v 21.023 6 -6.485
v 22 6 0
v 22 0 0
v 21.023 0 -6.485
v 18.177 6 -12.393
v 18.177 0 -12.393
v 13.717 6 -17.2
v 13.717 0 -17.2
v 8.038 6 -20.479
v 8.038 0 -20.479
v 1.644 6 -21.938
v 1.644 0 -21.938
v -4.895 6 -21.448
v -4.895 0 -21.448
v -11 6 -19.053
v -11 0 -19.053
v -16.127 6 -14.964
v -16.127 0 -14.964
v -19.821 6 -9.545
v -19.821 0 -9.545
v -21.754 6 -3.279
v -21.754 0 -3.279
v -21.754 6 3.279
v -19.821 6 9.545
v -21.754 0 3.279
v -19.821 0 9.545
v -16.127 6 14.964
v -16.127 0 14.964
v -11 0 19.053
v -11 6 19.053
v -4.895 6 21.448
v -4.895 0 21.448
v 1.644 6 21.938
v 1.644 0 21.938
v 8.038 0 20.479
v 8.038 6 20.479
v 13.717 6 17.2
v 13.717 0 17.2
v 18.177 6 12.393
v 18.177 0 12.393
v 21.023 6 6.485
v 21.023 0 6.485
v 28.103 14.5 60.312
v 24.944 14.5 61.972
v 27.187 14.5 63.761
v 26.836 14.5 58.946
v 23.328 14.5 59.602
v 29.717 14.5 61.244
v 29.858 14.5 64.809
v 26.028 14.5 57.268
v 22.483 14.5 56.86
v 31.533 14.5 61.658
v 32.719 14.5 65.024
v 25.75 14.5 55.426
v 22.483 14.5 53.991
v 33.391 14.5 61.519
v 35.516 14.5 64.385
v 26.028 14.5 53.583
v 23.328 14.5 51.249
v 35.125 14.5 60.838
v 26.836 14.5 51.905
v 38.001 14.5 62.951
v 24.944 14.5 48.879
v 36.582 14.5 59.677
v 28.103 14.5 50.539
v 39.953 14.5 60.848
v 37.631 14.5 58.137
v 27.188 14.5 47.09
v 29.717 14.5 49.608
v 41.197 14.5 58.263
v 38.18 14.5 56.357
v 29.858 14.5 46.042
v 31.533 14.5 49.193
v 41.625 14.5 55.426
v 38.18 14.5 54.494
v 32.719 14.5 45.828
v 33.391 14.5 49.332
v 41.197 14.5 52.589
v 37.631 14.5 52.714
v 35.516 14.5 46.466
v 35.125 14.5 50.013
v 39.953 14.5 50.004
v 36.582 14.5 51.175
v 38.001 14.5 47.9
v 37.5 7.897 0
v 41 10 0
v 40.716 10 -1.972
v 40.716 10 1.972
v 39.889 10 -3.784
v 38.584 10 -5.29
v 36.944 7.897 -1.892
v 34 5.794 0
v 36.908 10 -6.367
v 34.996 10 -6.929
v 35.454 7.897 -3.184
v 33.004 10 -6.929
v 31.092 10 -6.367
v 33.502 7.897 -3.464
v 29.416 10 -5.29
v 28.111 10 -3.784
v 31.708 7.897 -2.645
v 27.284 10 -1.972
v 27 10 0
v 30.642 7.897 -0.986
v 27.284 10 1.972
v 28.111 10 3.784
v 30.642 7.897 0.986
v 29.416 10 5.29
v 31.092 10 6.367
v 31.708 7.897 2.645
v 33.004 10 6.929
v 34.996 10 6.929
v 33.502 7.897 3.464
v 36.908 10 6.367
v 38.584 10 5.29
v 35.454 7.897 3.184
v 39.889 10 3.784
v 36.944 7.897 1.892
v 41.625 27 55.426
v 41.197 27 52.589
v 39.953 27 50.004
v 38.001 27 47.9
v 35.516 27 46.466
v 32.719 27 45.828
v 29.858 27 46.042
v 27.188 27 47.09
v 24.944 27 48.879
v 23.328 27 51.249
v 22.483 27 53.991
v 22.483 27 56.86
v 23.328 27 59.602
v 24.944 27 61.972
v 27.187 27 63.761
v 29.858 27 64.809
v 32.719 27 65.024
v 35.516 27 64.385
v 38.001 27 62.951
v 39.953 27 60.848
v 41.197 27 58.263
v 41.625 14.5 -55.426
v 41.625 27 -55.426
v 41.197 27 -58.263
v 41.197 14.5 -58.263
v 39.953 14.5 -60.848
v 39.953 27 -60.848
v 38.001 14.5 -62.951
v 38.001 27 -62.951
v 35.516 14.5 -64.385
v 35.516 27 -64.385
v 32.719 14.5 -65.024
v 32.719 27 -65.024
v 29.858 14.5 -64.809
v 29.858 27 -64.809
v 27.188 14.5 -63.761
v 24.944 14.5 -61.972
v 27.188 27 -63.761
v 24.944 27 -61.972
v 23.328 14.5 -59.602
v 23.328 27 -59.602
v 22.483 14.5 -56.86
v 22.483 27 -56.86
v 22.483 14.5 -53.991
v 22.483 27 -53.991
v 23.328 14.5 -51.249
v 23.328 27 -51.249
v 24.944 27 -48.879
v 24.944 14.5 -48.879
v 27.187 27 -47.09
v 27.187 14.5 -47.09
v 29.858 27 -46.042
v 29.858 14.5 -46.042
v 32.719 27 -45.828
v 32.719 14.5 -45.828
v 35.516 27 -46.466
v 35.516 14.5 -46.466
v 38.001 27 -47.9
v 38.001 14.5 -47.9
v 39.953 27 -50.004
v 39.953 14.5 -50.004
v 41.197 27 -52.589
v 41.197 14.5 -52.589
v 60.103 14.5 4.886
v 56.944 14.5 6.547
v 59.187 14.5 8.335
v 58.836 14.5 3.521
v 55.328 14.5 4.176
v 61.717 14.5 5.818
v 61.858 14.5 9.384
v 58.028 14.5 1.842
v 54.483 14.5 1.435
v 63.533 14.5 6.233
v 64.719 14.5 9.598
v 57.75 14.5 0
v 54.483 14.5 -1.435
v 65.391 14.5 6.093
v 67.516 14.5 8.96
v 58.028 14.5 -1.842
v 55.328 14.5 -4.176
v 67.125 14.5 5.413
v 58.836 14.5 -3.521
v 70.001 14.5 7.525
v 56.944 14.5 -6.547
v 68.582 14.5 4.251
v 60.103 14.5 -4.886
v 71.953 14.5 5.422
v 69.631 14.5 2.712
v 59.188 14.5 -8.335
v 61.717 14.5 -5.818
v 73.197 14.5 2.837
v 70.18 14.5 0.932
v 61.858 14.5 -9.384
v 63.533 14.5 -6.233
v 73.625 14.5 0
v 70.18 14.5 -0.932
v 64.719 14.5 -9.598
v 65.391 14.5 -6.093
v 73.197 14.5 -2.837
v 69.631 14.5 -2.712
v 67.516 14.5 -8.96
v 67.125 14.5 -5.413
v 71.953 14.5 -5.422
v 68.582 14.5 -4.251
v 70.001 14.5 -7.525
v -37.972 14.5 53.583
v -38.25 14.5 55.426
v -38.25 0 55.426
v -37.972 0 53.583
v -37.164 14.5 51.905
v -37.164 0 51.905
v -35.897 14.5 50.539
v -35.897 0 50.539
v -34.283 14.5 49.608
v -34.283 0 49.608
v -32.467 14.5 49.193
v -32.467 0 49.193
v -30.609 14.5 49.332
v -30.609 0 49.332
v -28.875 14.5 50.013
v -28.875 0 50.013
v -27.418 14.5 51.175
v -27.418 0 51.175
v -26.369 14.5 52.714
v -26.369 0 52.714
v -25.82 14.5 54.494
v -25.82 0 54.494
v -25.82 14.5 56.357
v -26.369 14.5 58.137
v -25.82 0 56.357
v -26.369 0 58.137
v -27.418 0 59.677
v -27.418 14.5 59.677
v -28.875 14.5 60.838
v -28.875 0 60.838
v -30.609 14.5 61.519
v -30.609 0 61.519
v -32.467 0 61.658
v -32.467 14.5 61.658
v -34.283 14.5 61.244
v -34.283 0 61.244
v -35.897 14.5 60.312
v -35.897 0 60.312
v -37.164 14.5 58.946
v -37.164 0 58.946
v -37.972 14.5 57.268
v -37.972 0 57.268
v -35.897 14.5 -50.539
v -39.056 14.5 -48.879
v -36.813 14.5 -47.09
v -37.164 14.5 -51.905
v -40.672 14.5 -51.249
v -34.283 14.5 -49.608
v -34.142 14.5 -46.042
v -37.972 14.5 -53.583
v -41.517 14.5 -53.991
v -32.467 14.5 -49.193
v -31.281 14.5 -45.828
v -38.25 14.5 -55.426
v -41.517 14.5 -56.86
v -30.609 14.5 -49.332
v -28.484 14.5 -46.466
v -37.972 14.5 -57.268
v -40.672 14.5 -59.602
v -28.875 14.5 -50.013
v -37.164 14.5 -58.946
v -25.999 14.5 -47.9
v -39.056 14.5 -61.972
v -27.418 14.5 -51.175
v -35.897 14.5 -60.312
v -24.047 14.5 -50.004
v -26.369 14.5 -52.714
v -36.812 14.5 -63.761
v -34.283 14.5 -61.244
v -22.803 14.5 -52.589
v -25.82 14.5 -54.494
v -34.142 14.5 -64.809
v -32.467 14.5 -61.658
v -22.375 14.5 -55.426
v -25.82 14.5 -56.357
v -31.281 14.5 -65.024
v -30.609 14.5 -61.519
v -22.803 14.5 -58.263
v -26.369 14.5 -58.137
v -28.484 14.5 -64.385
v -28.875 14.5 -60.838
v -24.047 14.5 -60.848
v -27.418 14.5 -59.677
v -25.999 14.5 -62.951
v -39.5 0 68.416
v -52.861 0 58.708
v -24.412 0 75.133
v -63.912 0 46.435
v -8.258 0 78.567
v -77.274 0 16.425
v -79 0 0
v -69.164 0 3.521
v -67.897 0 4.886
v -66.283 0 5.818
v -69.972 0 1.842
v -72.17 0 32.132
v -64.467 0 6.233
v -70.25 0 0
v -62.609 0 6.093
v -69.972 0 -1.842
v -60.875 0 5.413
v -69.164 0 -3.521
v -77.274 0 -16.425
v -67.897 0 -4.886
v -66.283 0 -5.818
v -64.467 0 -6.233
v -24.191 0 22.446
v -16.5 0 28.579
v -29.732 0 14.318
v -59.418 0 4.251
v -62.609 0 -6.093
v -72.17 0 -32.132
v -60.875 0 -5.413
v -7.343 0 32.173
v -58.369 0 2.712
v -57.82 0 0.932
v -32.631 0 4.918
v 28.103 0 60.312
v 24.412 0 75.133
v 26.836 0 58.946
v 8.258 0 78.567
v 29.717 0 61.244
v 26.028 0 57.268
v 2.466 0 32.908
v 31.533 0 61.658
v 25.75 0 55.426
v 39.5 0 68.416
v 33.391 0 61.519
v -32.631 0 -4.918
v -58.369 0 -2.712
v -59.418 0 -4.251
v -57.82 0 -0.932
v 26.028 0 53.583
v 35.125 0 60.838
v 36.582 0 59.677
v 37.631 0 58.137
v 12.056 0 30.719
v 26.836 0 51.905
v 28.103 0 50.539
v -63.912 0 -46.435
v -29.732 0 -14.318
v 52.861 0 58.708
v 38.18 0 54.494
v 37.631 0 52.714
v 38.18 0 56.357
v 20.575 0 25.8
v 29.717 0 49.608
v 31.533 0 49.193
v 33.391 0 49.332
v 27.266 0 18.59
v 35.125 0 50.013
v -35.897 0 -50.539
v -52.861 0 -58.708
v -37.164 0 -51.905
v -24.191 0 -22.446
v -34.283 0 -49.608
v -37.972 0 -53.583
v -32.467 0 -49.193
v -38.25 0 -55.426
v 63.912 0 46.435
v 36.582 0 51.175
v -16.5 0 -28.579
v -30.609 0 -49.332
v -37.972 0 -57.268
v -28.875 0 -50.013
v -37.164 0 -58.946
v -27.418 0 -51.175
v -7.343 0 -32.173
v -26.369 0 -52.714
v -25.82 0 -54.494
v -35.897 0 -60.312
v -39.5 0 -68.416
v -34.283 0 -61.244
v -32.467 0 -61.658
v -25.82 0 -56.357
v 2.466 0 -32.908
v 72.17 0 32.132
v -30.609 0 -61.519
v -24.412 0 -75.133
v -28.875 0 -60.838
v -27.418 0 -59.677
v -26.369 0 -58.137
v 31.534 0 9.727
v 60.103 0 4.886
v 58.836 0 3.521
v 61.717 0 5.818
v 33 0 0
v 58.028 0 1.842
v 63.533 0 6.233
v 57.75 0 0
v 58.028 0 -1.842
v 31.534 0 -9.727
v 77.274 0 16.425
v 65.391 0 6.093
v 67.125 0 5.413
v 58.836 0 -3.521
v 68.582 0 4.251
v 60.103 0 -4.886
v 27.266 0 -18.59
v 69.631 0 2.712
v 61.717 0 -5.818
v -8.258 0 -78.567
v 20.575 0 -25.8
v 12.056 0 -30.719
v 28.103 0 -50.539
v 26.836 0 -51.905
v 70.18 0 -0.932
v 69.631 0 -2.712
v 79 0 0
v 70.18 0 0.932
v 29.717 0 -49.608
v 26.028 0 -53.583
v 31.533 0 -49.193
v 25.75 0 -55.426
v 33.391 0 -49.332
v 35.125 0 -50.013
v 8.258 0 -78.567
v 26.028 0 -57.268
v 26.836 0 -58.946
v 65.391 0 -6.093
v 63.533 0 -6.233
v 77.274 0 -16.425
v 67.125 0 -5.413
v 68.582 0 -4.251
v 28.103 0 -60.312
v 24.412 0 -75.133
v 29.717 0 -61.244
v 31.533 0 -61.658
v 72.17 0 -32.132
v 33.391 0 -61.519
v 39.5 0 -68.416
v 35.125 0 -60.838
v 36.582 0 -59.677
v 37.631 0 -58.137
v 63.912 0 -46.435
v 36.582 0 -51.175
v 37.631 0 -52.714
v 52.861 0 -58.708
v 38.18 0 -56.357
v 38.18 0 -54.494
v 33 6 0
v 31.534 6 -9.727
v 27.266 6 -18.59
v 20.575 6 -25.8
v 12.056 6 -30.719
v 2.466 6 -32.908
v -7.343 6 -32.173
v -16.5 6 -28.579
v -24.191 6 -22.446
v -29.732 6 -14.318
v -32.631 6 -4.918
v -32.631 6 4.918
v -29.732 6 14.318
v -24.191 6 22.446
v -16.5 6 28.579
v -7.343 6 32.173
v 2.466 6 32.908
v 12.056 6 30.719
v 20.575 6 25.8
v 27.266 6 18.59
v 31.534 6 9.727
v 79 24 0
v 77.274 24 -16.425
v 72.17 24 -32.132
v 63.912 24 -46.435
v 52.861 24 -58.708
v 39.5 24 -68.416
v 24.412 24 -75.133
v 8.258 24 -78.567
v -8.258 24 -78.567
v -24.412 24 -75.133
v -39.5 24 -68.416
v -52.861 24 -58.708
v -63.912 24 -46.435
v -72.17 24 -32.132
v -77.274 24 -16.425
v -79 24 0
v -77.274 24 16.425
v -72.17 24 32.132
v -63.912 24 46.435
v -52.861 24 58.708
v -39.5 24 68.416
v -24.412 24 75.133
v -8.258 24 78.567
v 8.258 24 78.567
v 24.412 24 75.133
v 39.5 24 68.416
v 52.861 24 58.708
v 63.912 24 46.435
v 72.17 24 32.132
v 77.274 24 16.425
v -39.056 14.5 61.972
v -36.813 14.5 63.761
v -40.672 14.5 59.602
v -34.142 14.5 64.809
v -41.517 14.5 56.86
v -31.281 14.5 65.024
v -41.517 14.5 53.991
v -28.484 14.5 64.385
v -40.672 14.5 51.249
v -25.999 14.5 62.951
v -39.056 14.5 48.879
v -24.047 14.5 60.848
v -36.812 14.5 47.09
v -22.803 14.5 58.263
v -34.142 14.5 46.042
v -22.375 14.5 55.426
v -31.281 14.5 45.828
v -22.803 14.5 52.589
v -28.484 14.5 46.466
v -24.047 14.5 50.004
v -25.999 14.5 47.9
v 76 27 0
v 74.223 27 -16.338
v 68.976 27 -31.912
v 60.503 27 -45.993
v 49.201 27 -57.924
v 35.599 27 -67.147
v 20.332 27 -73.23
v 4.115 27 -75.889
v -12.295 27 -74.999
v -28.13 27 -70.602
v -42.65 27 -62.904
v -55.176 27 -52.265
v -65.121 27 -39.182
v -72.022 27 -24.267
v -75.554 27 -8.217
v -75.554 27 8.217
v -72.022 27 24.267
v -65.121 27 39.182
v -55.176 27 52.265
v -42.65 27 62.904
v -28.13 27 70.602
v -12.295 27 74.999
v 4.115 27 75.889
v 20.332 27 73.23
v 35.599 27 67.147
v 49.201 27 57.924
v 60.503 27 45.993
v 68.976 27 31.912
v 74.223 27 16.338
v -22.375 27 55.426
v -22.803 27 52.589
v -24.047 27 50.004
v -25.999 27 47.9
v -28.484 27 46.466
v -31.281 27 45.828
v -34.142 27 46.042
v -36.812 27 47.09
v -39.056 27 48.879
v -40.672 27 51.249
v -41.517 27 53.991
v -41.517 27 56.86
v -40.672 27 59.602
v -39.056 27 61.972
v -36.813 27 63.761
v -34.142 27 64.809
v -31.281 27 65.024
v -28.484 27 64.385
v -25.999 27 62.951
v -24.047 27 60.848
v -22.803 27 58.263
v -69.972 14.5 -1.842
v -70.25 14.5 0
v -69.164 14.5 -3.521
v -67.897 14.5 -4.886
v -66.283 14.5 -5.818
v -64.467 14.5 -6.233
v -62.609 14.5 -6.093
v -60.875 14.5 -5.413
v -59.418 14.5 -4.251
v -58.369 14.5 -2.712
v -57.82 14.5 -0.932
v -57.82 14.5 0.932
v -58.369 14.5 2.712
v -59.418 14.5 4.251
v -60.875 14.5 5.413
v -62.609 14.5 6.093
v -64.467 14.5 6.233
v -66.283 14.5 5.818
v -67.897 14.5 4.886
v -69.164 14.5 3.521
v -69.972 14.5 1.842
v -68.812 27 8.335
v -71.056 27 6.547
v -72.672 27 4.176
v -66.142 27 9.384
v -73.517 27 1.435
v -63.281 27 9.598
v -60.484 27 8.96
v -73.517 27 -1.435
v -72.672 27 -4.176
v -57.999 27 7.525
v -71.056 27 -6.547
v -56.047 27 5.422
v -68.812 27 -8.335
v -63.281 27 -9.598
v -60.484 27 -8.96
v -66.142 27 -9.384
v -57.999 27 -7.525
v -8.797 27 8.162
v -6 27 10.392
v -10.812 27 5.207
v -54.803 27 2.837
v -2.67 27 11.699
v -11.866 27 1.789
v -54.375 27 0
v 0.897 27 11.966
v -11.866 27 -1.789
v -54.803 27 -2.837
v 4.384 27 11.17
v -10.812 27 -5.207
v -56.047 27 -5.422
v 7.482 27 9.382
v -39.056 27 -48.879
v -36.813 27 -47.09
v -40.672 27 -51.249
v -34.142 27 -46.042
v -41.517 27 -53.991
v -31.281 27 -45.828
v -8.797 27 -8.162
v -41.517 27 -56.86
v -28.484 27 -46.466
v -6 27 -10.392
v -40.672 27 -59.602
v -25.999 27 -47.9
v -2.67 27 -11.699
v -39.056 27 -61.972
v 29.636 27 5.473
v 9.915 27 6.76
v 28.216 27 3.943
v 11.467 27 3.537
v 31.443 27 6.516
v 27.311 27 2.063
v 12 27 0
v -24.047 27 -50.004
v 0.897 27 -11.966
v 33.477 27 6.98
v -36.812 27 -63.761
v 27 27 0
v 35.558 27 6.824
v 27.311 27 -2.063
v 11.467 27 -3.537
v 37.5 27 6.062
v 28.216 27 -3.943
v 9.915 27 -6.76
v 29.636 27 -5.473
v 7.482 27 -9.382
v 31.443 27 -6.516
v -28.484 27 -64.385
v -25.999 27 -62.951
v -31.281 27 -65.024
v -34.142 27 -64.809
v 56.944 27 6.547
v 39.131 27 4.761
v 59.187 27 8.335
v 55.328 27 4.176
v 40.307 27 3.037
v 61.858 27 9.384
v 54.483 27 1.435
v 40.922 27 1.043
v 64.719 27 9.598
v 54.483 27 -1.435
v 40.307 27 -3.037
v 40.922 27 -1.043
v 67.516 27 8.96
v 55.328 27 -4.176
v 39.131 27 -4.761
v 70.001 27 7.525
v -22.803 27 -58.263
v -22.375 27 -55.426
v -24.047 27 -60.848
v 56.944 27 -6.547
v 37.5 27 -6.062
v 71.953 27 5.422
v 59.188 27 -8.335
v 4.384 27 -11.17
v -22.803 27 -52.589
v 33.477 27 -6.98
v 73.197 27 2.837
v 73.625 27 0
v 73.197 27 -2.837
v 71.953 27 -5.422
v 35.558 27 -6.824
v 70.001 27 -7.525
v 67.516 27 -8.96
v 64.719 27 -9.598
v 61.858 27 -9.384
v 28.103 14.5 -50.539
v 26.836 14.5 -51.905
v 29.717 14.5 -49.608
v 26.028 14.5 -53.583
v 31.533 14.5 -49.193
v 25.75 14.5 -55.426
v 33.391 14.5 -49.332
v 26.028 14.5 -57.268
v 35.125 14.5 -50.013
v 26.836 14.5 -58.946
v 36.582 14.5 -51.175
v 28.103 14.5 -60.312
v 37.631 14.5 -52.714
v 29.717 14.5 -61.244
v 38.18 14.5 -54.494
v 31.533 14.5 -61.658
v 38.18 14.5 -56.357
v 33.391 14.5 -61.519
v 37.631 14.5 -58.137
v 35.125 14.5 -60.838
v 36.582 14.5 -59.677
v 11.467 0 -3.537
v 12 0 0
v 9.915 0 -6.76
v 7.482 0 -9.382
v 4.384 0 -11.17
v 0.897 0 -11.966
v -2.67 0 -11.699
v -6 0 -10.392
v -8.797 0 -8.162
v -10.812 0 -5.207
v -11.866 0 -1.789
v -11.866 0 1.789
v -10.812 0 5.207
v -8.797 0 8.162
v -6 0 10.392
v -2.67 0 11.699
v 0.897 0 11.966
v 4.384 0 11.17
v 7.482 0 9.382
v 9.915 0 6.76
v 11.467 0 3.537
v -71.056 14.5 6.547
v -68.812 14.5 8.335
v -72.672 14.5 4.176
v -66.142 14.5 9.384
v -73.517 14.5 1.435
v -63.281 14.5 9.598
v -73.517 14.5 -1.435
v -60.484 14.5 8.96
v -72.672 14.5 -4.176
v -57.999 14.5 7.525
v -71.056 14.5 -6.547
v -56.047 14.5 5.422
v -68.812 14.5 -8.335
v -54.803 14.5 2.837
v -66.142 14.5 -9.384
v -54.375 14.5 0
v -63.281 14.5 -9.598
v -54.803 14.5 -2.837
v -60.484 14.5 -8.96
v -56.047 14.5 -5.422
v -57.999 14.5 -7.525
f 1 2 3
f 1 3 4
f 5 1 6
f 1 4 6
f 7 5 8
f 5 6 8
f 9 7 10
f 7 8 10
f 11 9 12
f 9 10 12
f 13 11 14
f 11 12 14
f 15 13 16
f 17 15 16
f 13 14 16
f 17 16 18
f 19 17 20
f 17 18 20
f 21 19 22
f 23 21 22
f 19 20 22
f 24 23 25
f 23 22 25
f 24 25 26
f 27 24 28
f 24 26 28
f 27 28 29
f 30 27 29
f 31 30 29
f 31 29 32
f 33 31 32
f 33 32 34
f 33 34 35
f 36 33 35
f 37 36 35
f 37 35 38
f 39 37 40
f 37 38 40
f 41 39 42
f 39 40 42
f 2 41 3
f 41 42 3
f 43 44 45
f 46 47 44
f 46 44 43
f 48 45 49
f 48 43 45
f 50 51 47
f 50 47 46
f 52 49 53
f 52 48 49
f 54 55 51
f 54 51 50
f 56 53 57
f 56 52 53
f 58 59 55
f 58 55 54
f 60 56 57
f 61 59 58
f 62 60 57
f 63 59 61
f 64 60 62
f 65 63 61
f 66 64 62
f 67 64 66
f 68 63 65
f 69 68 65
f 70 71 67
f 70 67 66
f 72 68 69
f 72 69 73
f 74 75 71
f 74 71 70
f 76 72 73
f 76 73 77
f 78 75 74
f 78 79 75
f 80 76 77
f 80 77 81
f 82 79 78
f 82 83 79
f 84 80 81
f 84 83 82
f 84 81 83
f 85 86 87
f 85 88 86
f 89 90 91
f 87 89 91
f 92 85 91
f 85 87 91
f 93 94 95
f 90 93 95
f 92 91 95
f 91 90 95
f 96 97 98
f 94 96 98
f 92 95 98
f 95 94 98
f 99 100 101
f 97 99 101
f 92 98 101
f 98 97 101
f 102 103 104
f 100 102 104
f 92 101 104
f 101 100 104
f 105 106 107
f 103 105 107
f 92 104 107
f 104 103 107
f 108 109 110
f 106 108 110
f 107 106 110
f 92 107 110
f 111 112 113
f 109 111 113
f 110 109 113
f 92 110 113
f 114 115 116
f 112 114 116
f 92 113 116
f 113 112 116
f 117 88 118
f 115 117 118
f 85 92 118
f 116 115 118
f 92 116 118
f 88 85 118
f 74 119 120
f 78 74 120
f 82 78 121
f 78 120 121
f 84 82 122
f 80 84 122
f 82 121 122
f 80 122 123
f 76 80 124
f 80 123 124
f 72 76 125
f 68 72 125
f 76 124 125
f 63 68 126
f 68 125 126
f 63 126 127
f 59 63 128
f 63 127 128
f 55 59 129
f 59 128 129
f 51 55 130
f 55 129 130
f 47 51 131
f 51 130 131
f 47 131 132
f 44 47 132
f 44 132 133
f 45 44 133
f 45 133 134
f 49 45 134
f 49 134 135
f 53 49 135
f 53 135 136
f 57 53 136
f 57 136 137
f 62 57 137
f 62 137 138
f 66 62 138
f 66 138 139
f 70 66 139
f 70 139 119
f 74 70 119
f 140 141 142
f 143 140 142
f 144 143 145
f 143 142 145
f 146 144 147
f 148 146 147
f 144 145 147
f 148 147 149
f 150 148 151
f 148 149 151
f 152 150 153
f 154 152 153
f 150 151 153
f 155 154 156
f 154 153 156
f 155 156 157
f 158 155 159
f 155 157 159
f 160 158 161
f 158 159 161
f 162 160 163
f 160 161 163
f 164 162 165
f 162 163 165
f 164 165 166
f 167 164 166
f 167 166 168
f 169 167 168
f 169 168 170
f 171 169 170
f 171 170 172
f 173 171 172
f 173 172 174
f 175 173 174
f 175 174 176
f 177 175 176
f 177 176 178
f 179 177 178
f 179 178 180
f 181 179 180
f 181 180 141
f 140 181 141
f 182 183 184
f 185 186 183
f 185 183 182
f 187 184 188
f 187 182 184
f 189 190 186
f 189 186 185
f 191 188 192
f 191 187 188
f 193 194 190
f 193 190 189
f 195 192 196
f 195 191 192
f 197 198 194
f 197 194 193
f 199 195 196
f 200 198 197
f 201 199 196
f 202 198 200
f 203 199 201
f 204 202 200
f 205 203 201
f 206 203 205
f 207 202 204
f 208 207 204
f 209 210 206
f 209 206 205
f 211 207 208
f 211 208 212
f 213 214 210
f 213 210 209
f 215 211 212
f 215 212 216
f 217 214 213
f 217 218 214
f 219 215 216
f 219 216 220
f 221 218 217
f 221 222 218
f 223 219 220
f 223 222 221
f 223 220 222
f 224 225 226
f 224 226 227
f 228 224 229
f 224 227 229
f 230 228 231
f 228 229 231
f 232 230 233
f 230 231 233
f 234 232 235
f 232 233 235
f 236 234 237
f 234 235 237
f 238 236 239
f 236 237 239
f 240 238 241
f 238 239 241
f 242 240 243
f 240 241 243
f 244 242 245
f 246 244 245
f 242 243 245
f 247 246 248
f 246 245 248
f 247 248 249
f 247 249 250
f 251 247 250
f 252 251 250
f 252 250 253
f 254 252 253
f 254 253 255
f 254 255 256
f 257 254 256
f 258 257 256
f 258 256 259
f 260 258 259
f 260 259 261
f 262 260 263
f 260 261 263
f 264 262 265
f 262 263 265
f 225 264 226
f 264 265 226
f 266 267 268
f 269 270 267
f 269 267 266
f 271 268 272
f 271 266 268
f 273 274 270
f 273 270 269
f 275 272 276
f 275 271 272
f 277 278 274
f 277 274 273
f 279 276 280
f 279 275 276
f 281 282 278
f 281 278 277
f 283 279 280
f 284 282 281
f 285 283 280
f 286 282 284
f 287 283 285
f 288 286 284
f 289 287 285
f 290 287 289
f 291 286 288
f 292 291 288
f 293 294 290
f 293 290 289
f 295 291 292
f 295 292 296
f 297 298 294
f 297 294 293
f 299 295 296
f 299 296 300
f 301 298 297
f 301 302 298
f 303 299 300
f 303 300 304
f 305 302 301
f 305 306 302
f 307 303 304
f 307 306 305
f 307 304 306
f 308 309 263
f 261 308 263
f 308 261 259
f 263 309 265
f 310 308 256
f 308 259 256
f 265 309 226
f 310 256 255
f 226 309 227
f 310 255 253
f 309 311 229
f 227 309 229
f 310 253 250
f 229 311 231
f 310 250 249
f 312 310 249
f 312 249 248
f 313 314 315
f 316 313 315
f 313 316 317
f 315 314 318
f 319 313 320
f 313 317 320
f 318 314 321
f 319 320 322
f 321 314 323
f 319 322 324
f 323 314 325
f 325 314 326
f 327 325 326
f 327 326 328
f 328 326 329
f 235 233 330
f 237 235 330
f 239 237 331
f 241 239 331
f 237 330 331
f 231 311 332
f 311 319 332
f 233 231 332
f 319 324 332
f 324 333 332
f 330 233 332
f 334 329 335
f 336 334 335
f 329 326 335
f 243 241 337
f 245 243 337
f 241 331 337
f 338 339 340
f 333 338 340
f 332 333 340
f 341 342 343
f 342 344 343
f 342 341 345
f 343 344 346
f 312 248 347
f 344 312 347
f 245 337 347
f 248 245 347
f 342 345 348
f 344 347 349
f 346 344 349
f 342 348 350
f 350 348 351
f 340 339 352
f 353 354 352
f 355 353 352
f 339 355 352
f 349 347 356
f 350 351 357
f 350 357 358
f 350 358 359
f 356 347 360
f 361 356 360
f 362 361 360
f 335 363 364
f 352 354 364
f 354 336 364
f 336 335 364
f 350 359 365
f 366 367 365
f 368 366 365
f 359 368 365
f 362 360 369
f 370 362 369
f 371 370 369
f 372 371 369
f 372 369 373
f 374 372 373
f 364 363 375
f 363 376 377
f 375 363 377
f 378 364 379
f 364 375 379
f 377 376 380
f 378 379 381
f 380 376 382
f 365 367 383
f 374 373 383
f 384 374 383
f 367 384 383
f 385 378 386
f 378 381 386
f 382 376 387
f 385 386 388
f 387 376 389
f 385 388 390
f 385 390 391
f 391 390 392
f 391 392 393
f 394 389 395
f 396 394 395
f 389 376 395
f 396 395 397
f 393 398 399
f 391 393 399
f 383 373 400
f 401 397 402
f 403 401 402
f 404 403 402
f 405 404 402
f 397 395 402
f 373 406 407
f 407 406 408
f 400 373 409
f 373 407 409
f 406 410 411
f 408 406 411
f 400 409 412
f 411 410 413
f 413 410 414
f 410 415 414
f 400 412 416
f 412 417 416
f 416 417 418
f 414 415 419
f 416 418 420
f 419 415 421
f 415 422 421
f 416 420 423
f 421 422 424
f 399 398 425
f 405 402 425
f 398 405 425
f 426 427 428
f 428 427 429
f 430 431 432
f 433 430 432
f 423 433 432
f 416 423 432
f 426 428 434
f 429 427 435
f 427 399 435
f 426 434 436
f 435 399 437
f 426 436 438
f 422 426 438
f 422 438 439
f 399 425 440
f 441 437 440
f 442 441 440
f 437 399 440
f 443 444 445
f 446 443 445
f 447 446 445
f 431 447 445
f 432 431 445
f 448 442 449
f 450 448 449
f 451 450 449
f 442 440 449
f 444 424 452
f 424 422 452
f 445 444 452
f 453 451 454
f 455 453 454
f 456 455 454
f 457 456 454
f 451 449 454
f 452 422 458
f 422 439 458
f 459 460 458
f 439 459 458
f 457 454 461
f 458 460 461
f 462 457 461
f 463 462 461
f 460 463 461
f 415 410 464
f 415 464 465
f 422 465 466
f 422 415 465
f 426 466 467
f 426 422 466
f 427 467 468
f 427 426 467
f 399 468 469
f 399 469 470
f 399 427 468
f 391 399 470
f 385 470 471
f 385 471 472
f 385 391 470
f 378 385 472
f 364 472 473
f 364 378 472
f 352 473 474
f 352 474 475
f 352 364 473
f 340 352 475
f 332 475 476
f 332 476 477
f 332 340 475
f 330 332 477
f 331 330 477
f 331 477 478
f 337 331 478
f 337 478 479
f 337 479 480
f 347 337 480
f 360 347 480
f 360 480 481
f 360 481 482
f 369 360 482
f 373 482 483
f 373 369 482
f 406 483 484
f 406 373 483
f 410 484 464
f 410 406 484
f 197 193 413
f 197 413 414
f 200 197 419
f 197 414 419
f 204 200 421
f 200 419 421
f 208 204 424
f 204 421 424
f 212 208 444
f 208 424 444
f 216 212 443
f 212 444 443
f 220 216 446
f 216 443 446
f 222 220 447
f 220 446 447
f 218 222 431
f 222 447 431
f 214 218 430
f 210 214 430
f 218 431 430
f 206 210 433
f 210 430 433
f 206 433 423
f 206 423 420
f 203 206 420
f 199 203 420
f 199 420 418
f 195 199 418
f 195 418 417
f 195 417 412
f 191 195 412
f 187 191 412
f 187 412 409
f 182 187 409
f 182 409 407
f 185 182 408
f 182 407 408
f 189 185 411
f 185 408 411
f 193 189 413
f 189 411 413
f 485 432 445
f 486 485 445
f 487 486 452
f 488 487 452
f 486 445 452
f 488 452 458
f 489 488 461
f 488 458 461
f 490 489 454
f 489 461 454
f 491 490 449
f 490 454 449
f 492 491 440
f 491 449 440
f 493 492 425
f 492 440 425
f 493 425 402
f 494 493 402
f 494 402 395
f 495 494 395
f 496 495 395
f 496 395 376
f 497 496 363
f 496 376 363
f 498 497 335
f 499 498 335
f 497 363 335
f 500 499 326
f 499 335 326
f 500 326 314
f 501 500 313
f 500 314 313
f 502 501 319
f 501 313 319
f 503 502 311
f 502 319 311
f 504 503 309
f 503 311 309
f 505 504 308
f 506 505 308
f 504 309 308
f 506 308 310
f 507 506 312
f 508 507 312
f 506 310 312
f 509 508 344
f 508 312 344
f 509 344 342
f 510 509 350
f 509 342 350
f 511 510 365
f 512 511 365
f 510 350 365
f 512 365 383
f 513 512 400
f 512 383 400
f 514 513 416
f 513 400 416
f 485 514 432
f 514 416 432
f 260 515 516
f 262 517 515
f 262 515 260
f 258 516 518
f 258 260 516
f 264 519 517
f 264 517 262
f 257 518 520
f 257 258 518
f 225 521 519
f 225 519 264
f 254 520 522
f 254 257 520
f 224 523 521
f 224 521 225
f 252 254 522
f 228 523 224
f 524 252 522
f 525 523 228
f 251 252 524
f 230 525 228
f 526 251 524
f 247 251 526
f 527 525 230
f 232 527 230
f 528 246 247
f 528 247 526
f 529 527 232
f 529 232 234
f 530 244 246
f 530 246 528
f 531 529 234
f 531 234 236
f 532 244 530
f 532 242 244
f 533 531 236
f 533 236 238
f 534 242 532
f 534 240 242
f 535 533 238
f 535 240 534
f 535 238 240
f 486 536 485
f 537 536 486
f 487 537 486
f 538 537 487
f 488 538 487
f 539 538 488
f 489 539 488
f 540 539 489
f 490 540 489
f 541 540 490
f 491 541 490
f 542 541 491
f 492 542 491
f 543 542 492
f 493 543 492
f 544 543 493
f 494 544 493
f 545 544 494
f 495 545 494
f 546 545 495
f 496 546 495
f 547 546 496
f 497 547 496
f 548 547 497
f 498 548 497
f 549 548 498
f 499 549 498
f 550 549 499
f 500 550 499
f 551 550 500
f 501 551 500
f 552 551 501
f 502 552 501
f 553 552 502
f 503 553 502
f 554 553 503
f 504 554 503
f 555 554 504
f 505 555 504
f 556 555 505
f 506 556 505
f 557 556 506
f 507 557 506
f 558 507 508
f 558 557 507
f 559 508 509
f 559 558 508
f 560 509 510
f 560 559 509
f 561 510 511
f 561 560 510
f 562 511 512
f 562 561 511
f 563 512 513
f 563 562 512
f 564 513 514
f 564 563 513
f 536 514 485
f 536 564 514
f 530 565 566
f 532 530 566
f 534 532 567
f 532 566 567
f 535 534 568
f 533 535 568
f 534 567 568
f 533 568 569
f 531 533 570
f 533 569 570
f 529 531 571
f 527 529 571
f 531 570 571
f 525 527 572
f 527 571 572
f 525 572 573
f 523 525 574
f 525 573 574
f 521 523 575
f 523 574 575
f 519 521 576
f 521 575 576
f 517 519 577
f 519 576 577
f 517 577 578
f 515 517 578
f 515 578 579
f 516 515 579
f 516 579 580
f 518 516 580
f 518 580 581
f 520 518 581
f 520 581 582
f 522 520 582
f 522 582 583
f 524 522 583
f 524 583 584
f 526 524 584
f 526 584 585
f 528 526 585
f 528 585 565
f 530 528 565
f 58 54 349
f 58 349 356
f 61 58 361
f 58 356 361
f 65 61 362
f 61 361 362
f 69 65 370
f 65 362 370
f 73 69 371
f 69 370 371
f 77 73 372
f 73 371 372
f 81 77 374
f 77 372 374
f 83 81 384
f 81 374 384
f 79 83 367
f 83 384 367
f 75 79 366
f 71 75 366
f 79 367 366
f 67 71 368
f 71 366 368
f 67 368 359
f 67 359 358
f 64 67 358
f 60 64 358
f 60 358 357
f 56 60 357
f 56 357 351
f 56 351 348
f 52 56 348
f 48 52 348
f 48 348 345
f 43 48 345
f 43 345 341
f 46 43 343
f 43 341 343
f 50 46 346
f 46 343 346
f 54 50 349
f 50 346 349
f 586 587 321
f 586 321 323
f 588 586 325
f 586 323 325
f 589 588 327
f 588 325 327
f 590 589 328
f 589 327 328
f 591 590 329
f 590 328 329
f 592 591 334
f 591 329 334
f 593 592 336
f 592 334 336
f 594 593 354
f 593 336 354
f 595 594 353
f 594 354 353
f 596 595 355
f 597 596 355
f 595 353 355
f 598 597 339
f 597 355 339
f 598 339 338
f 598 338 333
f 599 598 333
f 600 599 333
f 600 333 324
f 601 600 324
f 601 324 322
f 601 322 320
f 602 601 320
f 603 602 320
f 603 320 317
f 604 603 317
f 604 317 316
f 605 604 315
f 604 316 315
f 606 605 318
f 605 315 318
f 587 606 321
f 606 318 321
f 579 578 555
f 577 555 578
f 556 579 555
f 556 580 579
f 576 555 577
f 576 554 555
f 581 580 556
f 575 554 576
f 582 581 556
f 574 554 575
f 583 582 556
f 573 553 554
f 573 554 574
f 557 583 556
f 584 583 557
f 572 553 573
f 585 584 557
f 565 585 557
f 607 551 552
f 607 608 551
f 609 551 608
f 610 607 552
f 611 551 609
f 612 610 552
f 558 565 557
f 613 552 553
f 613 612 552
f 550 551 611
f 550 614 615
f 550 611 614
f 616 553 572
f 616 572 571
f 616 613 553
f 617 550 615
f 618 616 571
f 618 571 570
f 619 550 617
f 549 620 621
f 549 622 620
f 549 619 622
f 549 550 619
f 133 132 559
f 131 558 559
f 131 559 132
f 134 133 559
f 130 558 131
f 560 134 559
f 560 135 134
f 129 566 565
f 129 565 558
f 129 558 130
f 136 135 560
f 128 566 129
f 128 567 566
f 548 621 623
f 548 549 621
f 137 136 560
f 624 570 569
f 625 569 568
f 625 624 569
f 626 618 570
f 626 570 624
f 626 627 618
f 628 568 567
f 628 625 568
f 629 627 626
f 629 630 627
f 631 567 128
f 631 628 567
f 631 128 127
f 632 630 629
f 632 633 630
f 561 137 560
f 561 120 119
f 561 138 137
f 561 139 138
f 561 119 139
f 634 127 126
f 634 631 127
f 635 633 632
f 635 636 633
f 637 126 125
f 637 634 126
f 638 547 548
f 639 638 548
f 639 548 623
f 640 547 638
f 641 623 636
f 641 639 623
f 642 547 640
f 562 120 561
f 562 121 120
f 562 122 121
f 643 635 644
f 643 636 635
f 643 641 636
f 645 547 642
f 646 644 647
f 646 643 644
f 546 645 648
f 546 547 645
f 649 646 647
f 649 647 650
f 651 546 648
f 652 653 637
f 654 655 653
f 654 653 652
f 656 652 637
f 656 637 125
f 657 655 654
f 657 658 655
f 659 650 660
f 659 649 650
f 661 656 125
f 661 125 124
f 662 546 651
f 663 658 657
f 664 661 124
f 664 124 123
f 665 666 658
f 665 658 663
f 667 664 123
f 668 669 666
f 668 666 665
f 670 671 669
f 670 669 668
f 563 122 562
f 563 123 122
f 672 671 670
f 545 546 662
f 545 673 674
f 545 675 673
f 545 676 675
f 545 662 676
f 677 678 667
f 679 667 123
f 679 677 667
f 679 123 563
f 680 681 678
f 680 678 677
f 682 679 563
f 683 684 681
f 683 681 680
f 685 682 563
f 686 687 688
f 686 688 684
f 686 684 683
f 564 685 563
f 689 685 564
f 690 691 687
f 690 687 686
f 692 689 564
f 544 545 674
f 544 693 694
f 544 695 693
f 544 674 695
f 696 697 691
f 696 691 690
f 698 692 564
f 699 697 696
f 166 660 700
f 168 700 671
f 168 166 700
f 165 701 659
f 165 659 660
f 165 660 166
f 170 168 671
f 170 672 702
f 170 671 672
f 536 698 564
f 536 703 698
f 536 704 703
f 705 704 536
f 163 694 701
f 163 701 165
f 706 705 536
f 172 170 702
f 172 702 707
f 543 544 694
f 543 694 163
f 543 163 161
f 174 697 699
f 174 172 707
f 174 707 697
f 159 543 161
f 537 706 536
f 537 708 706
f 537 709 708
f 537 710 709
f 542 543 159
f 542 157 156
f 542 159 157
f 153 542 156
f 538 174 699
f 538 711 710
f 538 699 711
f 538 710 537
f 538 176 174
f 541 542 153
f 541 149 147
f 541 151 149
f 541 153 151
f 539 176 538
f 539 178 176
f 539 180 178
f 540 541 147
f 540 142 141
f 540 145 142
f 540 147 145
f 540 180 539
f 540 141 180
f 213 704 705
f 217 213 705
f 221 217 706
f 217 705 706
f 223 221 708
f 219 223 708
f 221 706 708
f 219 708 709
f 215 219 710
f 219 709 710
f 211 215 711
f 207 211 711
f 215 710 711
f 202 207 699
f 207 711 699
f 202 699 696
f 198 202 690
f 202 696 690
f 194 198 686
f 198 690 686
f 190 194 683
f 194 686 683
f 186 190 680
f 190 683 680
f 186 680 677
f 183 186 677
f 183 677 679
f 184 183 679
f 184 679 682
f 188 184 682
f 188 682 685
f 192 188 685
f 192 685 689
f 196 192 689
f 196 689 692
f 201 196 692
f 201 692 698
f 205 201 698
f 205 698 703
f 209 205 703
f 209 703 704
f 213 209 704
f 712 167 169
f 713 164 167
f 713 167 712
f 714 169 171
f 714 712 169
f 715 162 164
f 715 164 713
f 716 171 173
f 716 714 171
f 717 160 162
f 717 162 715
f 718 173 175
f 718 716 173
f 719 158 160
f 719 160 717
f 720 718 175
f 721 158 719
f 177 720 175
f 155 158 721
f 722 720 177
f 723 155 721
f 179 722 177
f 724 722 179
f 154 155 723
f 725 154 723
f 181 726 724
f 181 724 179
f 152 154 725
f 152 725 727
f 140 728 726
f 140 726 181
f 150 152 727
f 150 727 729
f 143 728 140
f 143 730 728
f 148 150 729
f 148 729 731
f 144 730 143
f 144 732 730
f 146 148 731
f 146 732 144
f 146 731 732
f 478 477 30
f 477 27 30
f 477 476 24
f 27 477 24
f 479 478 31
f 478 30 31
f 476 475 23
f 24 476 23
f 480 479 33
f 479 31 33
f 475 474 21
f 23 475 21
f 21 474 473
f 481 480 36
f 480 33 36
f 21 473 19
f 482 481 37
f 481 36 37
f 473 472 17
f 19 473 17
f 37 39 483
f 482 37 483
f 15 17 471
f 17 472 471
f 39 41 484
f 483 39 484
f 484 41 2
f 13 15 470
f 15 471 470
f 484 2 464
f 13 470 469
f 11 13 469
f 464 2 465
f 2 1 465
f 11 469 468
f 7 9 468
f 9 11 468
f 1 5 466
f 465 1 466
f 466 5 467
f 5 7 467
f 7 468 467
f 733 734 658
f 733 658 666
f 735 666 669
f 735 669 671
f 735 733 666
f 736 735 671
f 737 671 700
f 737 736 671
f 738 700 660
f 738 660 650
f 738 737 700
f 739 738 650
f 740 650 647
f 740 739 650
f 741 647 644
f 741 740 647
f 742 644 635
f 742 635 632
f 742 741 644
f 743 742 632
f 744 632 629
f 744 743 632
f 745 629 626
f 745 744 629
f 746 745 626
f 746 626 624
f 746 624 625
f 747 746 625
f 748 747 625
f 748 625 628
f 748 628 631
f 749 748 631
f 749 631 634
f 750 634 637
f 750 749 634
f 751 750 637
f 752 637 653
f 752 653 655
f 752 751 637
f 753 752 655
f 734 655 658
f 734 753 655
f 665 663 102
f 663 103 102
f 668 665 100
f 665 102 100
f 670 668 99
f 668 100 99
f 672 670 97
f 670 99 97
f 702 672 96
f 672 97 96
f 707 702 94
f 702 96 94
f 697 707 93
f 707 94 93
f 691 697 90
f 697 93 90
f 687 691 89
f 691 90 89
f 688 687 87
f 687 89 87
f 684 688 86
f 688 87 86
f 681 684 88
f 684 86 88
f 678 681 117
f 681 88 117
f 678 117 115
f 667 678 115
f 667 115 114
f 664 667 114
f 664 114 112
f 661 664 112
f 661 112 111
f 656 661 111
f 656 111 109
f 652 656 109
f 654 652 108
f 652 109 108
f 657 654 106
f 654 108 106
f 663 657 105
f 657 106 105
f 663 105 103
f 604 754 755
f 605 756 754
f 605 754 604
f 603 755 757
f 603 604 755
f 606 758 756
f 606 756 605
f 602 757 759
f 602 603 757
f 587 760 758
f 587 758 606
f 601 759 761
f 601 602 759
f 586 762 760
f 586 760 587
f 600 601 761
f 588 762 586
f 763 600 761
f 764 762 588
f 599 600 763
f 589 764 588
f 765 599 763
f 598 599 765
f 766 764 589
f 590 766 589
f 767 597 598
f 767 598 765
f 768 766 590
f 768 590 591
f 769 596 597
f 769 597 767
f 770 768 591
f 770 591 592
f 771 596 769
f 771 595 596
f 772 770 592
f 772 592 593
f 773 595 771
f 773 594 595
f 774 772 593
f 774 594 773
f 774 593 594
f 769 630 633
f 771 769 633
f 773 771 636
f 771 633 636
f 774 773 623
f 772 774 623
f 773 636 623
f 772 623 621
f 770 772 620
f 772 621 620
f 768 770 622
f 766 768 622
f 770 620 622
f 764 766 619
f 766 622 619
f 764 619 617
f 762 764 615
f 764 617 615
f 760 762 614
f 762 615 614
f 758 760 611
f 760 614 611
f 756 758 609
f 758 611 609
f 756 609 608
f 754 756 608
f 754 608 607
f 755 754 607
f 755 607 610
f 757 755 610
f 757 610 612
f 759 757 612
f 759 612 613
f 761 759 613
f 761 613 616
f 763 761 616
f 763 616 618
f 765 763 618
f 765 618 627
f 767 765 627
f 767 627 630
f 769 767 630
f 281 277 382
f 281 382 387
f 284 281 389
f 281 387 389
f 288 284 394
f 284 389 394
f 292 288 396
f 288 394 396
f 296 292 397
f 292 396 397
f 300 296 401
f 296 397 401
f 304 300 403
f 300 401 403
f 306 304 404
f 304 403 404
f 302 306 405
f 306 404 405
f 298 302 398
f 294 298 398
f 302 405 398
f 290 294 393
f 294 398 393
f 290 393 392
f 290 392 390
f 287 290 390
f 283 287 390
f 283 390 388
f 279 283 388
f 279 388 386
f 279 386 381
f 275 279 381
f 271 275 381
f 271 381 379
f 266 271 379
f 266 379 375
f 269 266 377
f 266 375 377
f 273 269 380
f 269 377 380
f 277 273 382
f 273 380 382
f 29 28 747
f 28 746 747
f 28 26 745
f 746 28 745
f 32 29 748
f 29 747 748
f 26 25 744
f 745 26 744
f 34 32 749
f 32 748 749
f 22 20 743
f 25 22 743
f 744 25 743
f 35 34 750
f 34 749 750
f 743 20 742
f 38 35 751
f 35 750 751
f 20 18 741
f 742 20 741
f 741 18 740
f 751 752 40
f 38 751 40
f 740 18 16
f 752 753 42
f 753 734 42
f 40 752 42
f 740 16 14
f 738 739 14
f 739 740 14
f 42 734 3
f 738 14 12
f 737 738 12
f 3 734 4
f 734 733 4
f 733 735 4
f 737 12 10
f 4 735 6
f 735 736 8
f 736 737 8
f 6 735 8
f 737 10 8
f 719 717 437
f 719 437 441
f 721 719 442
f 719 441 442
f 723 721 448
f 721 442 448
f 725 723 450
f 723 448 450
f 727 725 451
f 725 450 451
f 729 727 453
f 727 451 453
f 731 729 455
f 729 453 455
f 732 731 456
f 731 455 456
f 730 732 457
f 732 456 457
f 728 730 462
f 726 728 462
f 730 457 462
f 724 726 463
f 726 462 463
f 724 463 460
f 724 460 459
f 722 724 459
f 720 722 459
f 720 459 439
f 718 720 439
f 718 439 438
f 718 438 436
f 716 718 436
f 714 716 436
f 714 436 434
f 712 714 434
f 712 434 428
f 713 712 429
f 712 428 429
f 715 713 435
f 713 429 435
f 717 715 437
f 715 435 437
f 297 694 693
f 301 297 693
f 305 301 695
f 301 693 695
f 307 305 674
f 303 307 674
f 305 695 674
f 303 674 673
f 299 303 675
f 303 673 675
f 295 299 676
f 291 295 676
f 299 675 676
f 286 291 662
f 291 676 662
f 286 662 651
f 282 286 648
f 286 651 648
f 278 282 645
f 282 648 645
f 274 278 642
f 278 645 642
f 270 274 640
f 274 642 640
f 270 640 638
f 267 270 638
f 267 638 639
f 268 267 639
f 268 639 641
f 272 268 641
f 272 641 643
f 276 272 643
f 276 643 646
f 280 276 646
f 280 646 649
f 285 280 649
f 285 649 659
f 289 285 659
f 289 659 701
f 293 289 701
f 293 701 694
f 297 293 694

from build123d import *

# Parameters (mm, degrees)
SKETCH1_R                               = 79
SKETCH1_R_2                             = 12
BOSS_EXTRUDE1_DEPTH                     = 27
CBORE_FOR_M5_HEX_HEAD_BOLT1_D           = 12.5
CBORE_FOR_M5_HEX_HEAD_BOLT1_CBORE_D     = 19.25
CBORE_FOR_M5_HEX_HEAD_BOLT1_CBORE_DEPTH = 12.5
F_1_0MM_DOWEL_HOLE1_D                   = 14
F_1_0MM_DOWEL_HOLE1_DEPTH               = 17
F_1_0MM_DOWEL_HOLE1_TIP                 = 4.206024333
SKETCH8_R                               = 33
SKETCH8_R_2                             = 22
CUT_EXTRUDE1_DEPTH                      = 6
CHAMFER1_SIZE                           = 3


with BuildPart() as part:
    # Sketch1 → Boss-Extrude1 (new body)
    with BuildSketch(Plane(origin=(0, 0, 0), x_dir=(1, 0, 0), z_dir=(0, 1, 0))):
        Circle(SKETCH1_R)
        Circle(SKETCH1_R_2, mode=Mode.SUBTRACT)
    extrude(amount=BOSS_EXTRUDE1_DEPTH)

    # CBORE for M5 Hex Head Bolt1 (through all)
    with Locations(Plane(origin=(0, 27, 0), x_dir=(1, 0, 0), z_dir=(0, 1, 0))):
        with Locations((32, 55.425625842), (64, 0), (32, -55.425625842), (-32, -55.425625842), (-64, 0), (-32, 55.425625842), (0, 0)):
            CounterBoreHole(CBORE_FOR_M5_HEX_HEAD_BOLT1_D / 2, CBORE_FOR_M5_HEX_HEAD_BOLT1_CBORE_D / 2, CBORE_FOR_M5_HEX_HEAD_BOLT1_CBORE_DEPTH)

    # Ø1.0mm Dowel Hole1
    with Locations(Plane(origin=(0, 27, 0), x_dir=(1, 0, 0), z_dir=(0, 1, 0))):
        with Locations((34, 0)):
            Hole(F_1_0MM_DOWEL_HOLE1_D / 2, depth=F_1_0MM_DOWEL_HOLE1_DEPTH)
            with Locations((0, 0, -(F_1_0MM_DOWEL_HOLE1_DEPTH + F_1_0MM_DOWEL_HOLE1_TIP / 2))):  # 118° drill point
                Cone(0, F_1_0MM_DOWEL_HOLE1_D / 2, F_1_0MM_DOWEL_HOLE1_TIP, mode=Mode.SUBTRACT)

    # Sketch8 → Cut-Extrude1 (cut)
    with BuildSketch(Plane(origin=(0, 0, 0), x_dir=(1, 0, 0), z_dir=(0, 1, 0))):
        Circle(SKETCH8_R)
        Circle(SKETCH8_R_2, mode=Mode.SUBTRACT)
    extrude(amount=CUT_EXTRUDE1_DEPTH, mode=Mode.SUBTRACT)

    # Chamfer1
    chamfer1_edges = [part.edges().sort_by_distance(p)[0] for p in [
        (-79, 27, 0),
    ]]
    chamfer(chamfer1_edges, length=CHAMFER1_SIZE)


solid = part.part
